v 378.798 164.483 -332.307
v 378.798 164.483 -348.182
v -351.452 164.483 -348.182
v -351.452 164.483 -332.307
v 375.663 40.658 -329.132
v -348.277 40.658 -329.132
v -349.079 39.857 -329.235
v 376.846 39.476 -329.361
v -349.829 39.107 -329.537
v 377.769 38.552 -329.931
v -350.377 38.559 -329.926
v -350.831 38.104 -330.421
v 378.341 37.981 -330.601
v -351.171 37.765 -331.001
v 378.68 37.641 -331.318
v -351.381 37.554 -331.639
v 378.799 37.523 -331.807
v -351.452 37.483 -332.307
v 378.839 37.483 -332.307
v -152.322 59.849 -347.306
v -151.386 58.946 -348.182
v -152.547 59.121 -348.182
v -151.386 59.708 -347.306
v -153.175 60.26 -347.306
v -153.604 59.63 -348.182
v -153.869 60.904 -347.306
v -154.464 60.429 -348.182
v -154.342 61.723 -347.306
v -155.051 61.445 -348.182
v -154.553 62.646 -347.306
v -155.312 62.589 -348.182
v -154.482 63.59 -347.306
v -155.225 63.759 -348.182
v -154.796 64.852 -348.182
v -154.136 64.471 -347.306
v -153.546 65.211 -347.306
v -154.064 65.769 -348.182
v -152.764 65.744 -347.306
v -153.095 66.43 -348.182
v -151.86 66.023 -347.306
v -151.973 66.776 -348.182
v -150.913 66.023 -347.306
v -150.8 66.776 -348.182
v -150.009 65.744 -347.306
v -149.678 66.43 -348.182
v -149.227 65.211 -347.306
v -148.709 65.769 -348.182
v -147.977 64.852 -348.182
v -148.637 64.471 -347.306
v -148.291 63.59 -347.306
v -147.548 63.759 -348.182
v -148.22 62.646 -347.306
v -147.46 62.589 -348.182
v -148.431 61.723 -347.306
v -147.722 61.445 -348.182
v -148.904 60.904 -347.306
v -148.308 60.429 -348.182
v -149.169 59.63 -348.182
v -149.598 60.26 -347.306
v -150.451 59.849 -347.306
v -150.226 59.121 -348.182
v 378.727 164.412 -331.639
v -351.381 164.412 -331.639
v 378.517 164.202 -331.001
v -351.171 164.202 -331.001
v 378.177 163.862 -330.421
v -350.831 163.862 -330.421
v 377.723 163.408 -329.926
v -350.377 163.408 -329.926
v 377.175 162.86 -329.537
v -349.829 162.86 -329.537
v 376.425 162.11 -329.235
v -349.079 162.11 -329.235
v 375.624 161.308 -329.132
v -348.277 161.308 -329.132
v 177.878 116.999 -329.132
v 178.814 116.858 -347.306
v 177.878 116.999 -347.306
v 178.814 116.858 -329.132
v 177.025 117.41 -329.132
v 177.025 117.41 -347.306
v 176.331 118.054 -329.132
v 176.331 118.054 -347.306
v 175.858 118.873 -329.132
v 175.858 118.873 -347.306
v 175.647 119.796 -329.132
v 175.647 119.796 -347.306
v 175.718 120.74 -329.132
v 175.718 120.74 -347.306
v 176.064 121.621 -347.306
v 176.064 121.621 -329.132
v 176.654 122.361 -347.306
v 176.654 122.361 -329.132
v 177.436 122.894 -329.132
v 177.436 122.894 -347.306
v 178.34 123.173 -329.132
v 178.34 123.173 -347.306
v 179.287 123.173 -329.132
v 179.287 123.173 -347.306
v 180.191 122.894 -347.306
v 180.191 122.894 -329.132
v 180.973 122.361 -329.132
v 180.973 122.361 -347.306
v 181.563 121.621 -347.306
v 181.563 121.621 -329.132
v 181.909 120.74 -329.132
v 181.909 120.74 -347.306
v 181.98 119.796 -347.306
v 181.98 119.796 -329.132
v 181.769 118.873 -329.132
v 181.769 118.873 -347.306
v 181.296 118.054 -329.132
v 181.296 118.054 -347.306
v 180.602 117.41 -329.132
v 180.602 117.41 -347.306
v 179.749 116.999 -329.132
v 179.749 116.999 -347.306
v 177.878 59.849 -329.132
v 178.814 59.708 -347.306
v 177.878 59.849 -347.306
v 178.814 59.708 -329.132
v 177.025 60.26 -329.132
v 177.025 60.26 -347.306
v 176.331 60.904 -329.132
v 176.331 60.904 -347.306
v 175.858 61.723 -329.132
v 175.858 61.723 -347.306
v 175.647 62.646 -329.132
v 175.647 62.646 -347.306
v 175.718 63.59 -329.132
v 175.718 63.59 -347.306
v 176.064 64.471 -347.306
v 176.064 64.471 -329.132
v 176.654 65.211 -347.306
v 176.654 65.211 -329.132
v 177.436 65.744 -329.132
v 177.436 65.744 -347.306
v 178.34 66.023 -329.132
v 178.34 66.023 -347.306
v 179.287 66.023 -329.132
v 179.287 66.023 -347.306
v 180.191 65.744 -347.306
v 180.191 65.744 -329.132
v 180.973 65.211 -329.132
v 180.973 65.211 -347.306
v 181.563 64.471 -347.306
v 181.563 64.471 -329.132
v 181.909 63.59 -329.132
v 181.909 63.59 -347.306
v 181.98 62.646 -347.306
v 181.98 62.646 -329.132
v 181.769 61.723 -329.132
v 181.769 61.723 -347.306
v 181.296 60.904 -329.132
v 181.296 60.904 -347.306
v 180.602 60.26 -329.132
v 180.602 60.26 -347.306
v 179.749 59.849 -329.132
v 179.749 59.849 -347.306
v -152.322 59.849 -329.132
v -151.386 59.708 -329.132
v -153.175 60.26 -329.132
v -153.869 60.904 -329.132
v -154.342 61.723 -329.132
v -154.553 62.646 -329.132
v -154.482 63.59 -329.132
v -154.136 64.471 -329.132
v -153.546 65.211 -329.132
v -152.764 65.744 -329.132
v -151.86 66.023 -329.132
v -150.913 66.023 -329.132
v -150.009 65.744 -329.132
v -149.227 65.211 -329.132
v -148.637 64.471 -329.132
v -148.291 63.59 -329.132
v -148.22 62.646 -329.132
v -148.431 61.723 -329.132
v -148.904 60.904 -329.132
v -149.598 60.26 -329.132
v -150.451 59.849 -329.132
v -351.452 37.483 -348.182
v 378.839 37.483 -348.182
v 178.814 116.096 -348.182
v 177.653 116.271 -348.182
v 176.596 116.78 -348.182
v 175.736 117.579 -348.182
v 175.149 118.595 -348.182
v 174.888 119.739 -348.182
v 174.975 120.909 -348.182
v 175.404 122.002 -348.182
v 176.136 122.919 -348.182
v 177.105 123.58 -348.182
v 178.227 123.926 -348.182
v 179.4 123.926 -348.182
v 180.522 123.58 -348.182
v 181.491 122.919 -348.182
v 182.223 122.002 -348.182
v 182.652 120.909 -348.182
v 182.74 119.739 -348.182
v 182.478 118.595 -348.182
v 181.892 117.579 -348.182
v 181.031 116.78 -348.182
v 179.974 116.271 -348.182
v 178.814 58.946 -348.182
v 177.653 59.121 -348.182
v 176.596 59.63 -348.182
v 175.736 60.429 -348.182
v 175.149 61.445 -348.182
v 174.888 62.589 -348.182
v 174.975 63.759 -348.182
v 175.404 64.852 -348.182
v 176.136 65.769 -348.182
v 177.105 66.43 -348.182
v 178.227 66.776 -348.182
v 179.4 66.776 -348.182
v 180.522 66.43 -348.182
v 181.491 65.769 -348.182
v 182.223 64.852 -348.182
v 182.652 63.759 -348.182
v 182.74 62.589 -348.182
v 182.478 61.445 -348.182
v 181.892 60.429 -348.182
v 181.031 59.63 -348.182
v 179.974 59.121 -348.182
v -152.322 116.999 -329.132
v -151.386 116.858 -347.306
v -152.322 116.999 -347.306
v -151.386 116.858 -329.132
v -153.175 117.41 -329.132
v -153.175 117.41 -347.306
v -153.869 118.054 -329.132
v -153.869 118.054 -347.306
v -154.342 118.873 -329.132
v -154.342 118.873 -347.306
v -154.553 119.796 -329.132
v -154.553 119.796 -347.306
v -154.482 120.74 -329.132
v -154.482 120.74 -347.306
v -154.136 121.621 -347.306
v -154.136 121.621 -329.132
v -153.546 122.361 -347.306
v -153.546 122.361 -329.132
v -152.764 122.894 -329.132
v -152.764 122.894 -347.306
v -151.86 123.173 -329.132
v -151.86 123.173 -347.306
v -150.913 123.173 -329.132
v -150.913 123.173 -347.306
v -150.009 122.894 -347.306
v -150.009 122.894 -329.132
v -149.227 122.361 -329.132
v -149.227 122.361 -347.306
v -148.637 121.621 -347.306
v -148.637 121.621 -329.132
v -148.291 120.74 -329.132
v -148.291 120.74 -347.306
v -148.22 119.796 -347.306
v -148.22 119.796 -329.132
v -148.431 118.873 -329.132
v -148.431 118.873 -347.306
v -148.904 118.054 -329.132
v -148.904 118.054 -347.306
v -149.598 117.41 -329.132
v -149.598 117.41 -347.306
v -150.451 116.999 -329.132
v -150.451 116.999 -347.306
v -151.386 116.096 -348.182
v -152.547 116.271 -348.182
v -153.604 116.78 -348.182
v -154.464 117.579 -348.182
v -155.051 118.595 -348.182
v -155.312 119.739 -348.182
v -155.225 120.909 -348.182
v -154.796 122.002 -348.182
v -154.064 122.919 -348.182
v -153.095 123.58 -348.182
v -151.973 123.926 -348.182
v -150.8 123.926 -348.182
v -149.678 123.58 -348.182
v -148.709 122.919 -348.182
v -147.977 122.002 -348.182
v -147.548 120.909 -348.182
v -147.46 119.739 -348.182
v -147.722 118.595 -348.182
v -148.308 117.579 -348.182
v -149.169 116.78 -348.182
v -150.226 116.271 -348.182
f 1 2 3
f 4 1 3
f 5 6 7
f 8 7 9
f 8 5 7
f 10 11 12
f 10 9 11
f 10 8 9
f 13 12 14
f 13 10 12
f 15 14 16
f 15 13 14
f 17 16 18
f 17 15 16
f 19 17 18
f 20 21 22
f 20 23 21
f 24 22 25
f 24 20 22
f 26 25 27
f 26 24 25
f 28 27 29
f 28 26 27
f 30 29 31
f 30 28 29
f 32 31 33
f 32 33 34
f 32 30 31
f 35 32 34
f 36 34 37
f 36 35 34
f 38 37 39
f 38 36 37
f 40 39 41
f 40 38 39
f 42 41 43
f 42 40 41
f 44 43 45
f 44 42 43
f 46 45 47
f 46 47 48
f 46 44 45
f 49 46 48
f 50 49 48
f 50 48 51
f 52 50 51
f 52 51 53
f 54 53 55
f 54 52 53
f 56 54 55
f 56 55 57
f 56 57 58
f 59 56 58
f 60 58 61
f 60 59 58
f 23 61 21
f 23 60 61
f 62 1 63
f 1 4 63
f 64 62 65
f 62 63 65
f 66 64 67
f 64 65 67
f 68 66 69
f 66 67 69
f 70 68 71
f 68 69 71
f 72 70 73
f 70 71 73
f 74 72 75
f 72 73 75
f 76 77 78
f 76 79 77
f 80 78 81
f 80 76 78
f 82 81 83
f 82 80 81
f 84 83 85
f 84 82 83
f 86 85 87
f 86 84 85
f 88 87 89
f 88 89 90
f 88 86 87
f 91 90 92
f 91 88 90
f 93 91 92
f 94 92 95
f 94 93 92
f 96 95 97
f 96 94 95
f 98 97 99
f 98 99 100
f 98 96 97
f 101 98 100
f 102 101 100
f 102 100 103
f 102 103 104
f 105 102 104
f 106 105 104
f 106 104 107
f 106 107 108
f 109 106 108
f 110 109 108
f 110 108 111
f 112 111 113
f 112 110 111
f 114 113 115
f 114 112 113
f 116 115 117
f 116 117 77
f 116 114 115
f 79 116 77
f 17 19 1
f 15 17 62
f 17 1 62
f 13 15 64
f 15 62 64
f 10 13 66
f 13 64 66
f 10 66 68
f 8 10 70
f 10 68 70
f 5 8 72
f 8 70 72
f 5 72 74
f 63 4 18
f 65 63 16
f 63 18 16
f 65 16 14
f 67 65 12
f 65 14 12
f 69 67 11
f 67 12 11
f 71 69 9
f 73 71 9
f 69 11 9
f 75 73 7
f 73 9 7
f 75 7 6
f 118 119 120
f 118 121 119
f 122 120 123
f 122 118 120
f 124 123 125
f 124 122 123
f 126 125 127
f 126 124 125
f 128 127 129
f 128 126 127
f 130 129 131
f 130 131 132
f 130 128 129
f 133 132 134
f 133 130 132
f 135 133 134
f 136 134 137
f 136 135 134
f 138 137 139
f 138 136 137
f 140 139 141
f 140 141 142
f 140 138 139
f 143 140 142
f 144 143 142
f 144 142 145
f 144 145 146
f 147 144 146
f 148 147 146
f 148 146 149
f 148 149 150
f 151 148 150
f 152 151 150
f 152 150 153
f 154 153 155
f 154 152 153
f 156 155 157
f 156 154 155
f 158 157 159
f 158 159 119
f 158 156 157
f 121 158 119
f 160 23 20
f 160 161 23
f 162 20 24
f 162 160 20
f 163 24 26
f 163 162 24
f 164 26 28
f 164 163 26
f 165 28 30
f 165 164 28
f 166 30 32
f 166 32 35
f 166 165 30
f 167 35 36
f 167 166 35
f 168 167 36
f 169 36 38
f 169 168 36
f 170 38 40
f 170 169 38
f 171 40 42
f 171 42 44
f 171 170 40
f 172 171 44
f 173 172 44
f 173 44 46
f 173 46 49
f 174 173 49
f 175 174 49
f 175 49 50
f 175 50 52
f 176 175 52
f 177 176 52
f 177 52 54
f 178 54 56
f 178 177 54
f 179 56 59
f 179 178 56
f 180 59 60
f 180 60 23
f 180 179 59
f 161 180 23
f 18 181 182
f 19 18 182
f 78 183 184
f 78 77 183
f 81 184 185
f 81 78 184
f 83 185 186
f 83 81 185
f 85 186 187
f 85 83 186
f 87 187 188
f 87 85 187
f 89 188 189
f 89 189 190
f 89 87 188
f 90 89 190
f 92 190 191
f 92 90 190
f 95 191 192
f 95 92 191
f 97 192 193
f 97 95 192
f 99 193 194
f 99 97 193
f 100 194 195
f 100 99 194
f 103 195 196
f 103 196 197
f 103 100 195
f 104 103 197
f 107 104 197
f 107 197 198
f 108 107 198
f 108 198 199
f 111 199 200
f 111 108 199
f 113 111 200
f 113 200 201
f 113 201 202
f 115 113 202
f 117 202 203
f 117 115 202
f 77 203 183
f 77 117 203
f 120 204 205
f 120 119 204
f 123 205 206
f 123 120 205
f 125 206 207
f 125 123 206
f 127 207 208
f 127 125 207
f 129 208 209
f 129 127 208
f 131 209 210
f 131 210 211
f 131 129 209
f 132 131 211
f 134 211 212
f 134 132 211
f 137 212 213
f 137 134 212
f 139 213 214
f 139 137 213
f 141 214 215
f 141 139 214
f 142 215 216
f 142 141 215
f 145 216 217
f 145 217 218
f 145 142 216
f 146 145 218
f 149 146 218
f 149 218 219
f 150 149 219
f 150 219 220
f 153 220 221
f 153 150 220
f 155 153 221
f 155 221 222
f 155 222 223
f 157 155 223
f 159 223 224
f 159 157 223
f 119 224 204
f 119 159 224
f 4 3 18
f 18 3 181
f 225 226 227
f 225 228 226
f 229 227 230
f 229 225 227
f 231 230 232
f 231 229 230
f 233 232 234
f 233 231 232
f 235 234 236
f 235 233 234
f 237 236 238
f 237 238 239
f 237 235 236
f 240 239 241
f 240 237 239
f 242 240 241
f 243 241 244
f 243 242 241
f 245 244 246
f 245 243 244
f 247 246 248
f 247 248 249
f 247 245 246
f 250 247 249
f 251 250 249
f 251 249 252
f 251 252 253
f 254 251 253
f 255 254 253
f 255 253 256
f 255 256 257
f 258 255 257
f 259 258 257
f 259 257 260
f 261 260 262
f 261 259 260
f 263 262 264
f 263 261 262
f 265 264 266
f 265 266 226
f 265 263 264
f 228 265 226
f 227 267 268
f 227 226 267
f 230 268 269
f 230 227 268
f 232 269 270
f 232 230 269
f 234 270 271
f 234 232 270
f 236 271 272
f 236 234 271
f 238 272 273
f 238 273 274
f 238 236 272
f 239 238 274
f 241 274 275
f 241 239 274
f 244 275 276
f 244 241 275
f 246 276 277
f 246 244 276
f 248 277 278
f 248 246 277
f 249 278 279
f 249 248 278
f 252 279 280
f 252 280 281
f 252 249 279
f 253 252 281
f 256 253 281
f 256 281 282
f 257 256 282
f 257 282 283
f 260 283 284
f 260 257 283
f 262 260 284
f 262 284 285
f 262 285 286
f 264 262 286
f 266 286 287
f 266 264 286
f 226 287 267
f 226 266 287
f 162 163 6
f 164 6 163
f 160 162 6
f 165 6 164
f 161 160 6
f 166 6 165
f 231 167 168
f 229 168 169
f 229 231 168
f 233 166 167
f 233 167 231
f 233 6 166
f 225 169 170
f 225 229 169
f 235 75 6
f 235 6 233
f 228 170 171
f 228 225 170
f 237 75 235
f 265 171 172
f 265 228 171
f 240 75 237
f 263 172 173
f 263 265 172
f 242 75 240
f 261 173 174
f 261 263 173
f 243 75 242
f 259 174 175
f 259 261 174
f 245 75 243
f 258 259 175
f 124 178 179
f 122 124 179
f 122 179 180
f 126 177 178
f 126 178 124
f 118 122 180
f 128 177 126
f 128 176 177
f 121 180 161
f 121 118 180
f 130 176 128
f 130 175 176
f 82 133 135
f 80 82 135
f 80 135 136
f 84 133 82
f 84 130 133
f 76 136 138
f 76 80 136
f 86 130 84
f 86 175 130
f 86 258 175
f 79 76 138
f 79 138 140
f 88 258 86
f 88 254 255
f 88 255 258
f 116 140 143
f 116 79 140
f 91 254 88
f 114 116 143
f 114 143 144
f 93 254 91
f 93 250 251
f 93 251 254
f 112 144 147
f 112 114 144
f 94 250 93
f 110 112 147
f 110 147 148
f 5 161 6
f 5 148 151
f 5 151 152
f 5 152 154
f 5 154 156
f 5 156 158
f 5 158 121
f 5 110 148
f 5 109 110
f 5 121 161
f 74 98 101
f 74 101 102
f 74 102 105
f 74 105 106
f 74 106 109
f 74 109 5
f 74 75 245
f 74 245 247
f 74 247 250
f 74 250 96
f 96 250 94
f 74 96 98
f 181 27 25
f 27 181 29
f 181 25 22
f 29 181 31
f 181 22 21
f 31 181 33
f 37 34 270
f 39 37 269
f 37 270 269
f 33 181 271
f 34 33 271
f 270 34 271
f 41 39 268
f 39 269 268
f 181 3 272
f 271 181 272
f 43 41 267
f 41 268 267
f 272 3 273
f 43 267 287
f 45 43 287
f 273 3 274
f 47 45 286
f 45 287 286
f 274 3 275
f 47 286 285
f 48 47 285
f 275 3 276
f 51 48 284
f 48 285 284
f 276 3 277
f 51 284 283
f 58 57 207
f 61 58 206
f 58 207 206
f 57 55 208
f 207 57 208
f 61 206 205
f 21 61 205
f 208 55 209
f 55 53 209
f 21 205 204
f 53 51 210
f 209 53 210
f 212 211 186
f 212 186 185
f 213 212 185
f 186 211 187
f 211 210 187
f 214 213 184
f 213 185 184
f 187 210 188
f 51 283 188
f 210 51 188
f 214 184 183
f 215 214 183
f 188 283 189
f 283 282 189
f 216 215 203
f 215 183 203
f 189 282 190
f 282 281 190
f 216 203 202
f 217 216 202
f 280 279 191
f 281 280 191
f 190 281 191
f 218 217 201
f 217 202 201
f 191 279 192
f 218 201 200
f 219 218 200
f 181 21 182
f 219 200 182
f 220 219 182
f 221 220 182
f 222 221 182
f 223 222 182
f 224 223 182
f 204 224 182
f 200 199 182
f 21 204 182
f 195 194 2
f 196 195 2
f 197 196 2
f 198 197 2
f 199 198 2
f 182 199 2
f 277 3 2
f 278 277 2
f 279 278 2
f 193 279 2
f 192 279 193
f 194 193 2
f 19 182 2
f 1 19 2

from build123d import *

# Parameters (mm, degrees)
BOSS_EXTRUDE1_DEPTH                  = 19.05
F_1_4_0_25_DIAMETER_HOLE1_AT_2_COUNT = 2
F_1_4_0_25_DIAMETER_HOLE1_AT_2_PITCH = 57.15
F_1_4_0_25_DIAMETER_HOLE1_AT_3_COUNT = 2
F_1_4_0_25_DIAMETER_HOLE1_AT_3_PITCH = 335.10917997
F_1_4_0_25_DIAMETER_HOLE1_AT_4_COUNT = 2
F_1_4_0_25_DIAMETER_HOLE1_AT_4_PITCH = 330.2
FILLET1_R                            = 3.175


with BuildPart() as part:
    # Sketch1 → Boss-Extrude1 (new body)
    with BuildSketch(Plane.XY.offset(-348.182458287)):
        Polygon((378.797753528, 164.483362877), (-351.452246472, 164.483362877), (-351.452246472, 37.483362877), (378.838596905, 37.483362877), align=None)
    extrude(amount=BOSS_EXTRUDE1_DEPTH)

    # Sketch5 → 1/4 (0.25) Diameter Hole1 (revolve, cut)
    with BuildSketch(Plane(origin=(-151.386403095, 120.033362877, -329.132458287), x_dir=(0, -1, 0), z_dir=(1, 0, 0))):
        Polygon((0, 0), (0, 19.05), (3.937, 19.05), (3.175, 18.173419274), (3.175, 0), align=None)
    f_1_4_0_25_diameter_hole1 = revolve(axis=Axis((-151.386403095, 120.033362877, -322.782458287), (0, 0, -1)), mode=Mode.SUBTRACT)

    # 1/4 (0.25) Diameter Hole1 at 2: 1/4 (0.25) Diameter Hole1 ×2
    with Locations(*[(0, -i * F_1_4_0_25_DIAMETER_HOLE1_AT_2_PITCH, 0) for i in range(1, F_1_4_0_25_DIAMETER_HOLE1_AT_2_COUNT)]):
        add(f_1_4_0_25_diameter_hole1, mode=Mode.SUBTRACT)

    # 1/4 (0.25) Diameter Hole1 at 3: 1/4 (0.25) Diameter Hole1 ×2
    with Locations(*[Vector(0.9853505058554479, -0.17054143370575073, 0) * (i * F_1_4_0_25_DIAMETER_HOLE1_AT_3_PITCH) for i in range(1, F_1_4_0_25_DIAMETER_HOLE1_AT_3_COUNT)]):
        add(f_1_4_0_25_diameter_hole1, mode=Mode.SUBTRACT)

    # 1/4 (0.25) Diameter Hole1 at 4: 1/4 (0.25) Diameter Hole1 ×2
    with Locations(*[(i * F_1_4_0_25_DIAMETER_HOLE1_AT_4_PITCH, 0, 0) for i in range(1, F_1_4_0_25_DIAMETER_HOLE1_AT_4_COUNT)]):
        add(f_1_4_0_25_diameter_hole1, mode=Mode.SUBTRACT)

    # Fillet1
    fillet1_edges = [part.edges().sort_by_distance(p)[0] for p in [
        (13.672753528, 164.483362877, -329.132458287),
        (-351.452246472, 100.983362877, -329.132458287),
        (13.693175216, 37.483362877, -329.132458287),
        (378.818175216, 100.983362877, -329.132458287),
    ]]
    fillet(fillet1_edges, radius=FILLET1_R)


solid = part.part
